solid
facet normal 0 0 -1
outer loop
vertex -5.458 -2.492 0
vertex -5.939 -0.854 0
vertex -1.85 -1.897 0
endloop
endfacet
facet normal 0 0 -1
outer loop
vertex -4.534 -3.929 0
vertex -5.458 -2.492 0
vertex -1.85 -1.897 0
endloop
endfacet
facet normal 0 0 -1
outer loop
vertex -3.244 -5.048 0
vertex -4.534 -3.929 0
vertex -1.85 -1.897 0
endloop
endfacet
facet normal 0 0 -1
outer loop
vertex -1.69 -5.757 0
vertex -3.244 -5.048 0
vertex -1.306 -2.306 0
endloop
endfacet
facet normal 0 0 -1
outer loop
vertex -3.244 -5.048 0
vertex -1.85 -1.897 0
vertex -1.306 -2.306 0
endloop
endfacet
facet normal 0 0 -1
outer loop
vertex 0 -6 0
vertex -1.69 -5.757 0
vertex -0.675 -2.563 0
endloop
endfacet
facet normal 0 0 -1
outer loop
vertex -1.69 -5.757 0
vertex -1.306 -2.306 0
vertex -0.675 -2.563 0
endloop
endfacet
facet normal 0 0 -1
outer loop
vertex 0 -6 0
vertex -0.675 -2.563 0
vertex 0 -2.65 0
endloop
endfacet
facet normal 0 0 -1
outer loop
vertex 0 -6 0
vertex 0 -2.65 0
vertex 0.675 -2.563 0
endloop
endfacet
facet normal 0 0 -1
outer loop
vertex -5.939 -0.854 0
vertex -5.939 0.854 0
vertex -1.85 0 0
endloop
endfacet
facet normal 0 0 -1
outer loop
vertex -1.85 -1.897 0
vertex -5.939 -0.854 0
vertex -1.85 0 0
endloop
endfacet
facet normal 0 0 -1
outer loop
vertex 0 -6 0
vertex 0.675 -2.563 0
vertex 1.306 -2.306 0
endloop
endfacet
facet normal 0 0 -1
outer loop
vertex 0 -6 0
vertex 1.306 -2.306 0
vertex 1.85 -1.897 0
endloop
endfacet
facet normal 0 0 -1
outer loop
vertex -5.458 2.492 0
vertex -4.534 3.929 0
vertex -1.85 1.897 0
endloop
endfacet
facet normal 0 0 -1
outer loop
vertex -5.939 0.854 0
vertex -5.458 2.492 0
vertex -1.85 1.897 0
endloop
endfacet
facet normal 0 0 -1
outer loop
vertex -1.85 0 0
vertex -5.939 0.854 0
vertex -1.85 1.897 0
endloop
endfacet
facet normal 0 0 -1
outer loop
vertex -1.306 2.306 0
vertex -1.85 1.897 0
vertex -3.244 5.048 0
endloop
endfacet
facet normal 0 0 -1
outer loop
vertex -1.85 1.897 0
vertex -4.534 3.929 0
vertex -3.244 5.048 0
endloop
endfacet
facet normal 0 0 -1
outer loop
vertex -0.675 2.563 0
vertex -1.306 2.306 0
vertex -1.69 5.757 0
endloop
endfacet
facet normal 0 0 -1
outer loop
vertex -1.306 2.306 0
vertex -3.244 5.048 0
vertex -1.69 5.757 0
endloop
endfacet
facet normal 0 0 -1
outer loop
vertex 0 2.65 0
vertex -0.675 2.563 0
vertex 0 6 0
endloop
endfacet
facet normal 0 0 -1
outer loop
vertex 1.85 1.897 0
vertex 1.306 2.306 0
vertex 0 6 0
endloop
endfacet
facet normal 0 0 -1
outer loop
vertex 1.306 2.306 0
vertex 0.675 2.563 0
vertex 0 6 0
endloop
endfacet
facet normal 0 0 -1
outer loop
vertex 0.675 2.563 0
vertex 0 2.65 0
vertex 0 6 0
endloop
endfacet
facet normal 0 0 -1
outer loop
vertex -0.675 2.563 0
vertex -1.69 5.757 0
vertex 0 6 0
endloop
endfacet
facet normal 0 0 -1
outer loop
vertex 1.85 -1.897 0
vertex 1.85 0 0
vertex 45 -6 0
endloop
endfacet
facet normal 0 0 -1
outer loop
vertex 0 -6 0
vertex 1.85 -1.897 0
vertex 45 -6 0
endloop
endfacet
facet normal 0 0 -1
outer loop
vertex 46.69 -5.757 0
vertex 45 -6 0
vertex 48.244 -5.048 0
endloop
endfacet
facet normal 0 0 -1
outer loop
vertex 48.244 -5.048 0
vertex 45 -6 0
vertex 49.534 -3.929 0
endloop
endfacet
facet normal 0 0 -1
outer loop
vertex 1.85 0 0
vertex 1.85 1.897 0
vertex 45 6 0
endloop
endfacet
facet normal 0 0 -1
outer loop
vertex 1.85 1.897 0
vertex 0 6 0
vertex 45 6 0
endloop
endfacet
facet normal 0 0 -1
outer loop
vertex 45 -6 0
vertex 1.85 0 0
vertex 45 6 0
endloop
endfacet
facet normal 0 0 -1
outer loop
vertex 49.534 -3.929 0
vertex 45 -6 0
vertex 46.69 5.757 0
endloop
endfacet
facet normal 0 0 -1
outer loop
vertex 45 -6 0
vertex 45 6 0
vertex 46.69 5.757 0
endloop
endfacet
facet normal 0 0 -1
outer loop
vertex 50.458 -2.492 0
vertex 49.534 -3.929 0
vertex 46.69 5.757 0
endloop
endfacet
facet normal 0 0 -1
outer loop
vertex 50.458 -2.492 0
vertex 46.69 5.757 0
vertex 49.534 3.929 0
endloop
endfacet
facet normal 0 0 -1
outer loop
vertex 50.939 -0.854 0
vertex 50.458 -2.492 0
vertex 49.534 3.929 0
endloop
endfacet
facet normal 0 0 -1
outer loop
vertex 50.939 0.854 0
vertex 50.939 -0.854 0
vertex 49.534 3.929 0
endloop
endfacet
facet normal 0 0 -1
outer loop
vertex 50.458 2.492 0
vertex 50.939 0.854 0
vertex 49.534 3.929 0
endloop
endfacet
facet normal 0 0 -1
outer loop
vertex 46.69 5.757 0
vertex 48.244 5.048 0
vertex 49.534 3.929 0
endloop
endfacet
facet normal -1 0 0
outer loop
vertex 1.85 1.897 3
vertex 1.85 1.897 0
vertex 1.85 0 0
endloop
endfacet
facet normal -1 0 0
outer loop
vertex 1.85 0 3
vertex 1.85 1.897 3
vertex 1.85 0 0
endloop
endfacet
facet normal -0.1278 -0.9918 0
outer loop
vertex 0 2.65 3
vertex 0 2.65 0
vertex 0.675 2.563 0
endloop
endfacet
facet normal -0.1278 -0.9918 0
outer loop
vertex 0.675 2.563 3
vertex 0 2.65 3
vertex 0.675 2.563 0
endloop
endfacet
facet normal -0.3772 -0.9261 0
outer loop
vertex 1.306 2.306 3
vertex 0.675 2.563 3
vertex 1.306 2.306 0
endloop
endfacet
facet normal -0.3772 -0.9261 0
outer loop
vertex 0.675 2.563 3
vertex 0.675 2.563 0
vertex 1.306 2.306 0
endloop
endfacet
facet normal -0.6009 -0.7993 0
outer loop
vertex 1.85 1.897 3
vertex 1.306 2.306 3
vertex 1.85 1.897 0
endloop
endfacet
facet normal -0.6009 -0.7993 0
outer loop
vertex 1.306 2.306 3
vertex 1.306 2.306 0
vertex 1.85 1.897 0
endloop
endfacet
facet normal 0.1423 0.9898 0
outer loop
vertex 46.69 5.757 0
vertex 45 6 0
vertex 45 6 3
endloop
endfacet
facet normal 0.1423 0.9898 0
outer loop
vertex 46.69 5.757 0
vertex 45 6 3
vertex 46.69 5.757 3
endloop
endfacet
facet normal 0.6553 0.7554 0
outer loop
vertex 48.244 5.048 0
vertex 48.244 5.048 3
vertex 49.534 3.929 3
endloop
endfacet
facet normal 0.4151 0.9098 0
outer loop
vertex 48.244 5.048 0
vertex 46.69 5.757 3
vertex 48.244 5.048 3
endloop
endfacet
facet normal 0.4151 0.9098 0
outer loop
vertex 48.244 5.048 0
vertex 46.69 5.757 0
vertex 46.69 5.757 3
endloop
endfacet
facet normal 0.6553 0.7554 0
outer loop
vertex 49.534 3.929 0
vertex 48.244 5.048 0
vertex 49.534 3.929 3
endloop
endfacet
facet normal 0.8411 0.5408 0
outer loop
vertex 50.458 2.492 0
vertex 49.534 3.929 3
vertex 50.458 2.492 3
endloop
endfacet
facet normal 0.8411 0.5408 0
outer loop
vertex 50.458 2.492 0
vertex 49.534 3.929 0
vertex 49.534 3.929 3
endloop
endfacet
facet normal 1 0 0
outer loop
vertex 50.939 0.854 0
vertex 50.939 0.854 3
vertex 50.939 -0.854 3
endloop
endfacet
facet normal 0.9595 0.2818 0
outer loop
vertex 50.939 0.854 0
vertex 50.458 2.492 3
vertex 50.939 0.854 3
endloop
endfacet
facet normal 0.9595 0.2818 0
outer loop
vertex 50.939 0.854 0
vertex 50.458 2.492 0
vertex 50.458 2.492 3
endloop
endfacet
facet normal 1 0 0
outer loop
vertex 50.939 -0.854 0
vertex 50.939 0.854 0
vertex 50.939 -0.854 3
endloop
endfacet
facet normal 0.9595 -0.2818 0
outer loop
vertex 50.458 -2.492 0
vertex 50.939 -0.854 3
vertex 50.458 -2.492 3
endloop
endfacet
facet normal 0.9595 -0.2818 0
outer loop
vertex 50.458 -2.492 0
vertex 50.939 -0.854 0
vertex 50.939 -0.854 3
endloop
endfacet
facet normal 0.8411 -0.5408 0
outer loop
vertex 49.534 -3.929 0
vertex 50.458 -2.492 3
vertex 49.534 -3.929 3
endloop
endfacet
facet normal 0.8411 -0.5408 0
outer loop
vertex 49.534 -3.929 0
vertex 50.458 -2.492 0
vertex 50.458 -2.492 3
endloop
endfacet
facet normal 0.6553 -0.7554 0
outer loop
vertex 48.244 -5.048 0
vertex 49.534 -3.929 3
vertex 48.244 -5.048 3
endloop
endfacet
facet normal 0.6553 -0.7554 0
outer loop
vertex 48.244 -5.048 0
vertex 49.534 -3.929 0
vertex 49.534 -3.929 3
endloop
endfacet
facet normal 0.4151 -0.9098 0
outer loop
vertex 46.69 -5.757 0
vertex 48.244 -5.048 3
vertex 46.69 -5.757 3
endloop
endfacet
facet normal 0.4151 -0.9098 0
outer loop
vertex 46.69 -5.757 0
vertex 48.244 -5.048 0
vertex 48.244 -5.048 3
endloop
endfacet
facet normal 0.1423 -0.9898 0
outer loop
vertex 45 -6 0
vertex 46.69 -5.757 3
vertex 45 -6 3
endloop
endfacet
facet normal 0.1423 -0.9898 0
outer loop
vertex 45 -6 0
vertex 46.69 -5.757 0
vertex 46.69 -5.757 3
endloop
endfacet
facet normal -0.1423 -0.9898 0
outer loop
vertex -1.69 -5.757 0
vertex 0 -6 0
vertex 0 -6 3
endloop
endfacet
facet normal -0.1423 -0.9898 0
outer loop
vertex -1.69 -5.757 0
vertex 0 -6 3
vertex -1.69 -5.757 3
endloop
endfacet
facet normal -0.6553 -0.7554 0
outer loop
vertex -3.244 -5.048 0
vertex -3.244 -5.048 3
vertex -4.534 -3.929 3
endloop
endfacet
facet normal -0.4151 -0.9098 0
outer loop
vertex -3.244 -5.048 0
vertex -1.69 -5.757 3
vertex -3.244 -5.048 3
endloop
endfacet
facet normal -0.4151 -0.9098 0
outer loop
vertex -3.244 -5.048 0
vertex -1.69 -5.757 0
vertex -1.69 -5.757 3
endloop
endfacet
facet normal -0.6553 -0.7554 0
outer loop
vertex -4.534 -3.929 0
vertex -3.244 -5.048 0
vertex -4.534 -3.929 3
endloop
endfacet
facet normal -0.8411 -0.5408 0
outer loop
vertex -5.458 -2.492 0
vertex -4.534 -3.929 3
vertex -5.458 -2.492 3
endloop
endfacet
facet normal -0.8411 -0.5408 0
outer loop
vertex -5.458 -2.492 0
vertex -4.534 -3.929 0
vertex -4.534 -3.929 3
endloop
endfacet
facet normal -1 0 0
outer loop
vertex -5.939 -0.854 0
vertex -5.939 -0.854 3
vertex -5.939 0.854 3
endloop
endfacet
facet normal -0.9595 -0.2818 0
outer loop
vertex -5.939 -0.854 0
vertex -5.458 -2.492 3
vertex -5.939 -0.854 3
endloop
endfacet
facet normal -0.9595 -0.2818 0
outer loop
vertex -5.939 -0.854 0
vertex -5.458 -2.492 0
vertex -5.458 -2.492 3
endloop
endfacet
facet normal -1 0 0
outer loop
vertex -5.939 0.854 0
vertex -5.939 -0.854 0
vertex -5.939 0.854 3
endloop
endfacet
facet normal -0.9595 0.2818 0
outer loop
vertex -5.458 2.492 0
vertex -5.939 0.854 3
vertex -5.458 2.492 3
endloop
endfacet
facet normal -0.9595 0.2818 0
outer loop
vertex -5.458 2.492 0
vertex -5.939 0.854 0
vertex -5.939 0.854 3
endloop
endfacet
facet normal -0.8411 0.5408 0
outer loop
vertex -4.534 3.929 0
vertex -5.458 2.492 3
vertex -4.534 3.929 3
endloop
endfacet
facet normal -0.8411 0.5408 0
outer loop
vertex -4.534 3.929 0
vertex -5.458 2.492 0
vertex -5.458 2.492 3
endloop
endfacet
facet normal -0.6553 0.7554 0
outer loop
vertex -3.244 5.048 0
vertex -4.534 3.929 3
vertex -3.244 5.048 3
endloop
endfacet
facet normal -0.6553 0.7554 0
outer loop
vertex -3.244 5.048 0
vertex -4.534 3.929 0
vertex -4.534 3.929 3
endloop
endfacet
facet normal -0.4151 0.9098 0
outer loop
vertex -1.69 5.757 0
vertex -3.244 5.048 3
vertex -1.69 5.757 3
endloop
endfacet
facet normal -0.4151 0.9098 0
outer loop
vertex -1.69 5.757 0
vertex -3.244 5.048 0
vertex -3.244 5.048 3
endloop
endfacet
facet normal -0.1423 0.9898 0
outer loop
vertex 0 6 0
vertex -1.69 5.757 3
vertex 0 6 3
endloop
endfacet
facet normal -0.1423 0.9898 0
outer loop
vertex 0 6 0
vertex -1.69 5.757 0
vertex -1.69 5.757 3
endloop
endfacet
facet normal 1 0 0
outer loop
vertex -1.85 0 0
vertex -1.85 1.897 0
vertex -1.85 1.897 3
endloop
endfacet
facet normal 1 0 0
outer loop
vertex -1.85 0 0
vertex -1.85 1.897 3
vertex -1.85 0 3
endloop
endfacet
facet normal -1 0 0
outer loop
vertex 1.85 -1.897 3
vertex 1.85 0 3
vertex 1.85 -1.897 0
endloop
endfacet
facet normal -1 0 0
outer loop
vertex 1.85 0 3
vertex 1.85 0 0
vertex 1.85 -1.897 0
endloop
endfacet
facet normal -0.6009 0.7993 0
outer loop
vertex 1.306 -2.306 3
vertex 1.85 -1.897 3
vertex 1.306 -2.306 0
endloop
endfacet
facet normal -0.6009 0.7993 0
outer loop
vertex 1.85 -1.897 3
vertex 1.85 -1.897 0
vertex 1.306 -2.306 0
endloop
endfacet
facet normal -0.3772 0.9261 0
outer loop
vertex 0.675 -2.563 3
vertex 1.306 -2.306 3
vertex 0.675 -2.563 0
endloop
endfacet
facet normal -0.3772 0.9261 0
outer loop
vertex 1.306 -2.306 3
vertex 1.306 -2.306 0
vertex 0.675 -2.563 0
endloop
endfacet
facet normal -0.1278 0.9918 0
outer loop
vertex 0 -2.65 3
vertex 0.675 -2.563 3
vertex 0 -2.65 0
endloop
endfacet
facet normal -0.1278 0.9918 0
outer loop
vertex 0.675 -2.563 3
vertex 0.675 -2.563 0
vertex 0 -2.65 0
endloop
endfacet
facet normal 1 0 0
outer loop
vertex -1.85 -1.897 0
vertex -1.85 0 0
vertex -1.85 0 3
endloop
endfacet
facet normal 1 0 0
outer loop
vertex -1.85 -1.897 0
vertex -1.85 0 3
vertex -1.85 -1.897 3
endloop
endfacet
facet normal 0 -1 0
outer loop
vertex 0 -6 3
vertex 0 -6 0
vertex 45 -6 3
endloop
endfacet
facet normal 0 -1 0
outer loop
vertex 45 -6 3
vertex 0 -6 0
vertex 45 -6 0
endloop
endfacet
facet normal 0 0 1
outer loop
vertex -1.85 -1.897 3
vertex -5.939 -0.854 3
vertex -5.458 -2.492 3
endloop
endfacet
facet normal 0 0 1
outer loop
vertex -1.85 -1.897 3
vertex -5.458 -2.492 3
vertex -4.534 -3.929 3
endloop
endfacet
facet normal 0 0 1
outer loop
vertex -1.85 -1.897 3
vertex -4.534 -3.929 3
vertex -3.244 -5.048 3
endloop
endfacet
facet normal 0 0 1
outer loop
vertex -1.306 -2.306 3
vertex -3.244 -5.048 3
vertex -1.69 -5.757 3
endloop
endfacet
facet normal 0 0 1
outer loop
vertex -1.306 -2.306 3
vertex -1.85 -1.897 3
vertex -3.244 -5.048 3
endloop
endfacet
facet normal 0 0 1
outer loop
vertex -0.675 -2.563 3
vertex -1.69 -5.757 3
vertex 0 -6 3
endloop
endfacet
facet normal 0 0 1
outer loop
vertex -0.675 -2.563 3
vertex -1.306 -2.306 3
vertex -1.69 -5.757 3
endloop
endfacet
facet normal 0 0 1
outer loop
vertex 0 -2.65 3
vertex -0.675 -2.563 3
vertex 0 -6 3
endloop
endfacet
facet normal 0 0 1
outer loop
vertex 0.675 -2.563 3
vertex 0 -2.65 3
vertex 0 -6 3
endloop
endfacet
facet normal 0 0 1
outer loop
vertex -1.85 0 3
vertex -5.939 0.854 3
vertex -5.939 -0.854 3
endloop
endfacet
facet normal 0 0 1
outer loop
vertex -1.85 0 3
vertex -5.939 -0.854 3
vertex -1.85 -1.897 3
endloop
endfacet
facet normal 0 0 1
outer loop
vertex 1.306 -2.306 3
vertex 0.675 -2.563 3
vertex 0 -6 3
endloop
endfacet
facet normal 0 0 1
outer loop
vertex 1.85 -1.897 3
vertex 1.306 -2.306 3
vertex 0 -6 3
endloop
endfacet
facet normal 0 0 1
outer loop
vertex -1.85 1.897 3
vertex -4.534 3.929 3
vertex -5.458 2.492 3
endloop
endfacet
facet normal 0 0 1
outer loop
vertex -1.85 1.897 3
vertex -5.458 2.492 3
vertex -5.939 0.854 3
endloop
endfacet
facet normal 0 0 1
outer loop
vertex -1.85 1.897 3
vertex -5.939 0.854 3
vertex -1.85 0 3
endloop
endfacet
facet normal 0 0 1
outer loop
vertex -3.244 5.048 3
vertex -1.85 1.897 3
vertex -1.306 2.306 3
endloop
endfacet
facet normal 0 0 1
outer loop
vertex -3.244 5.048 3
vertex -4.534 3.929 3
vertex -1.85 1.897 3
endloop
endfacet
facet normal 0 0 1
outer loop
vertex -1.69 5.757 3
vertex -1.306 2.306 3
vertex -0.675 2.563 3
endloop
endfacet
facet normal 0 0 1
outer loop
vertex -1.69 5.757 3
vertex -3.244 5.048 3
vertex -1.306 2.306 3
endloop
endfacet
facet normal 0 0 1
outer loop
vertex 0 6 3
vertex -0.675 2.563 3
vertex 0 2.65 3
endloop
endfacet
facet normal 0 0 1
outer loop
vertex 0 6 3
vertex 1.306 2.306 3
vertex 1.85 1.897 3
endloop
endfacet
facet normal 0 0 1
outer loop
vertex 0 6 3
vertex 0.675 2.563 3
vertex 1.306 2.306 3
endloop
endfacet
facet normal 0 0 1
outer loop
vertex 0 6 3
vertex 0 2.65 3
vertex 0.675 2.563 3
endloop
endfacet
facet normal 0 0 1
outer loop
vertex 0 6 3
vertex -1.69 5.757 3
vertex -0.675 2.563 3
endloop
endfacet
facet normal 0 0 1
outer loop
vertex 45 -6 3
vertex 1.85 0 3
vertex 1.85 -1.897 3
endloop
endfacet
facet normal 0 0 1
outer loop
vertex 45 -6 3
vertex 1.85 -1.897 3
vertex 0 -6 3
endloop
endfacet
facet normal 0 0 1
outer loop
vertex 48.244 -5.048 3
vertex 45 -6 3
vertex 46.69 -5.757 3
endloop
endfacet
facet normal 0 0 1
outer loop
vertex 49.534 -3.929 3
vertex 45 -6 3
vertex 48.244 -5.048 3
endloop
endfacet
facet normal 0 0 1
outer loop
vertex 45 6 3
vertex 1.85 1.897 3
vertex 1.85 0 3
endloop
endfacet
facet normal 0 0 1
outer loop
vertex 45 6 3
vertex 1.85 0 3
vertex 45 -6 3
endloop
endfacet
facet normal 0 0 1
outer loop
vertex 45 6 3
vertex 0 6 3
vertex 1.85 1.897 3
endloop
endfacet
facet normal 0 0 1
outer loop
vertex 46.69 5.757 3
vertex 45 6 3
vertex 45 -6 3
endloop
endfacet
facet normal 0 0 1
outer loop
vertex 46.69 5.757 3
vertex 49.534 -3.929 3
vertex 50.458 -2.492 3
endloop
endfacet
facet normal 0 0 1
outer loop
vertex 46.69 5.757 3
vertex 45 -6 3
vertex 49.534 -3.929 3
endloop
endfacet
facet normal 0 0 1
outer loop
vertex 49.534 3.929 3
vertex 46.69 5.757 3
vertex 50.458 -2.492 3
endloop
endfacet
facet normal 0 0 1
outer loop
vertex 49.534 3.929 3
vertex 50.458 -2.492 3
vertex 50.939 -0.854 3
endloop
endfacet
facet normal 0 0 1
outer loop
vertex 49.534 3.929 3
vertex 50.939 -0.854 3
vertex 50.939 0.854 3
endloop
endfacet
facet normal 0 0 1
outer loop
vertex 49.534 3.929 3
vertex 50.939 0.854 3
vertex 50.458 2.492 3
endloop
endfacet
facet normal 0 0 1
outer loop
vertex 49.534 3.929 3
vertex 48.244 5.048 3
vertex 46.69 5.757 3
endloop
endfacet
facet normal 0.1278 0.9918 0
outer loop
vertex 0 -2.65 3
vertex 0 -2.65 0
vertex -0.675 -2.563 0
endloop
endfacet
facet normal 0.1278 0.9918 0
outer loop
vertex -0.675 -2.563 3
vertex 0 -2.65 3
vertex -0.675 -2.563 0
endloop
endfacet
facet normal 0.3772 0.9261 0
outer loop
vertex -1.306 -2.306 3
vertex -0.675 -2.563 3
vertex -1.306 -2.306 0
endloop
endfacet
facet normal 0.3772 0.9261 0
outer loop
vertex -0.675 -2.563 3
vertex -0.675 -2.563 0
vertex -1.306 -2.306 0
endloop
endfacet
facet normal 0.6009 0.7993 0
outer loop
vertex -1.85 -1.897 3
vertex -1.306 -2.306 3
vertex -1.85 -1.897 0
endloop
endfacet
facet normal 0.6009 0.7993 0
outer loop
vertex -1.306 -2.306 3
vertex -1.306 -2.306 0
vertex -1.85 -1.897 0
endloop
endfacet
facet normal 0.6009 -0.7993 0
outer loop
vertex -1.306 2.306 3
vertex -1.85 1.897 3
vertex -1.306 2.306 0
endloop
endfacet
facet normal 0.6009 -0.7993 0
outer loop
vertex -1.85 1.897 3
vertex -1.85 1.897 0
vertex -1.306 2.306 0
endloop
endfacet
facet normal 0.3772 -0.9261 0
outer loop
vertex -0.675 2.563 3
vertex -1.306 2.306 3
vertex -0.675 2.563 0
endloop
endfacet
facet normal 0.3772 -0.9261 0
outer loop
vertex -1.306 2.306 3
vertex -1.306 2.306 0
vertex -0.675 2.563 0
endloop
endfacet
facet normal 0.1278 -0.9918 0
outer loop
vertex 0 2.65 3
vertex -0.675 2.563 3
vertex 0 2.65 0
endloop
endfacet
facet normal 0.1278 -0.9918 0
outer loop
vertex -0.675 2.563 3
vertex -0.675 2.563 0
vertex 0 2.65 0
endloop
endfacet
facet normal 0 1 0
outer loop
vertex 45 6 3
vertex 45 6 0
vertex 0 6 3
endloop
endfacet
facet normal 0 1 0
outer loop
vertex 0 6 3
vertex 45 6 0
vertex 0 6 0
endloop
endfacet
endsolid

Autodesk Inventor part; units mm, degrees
ref_plane "YZ Plane" through (0, 0, 0) normal (1, 0, 0) x (0, 1, 0)
ref_plane "XZ Plane" through (0, 0, 0) normal (0, 1, 0) x (-1, 0, 0)
ref_plane "XY Plane" through (0, 0, 0) normal (0, 0, 1) x (1, 0, 0)
sketch "Sketch1" plane through (0, 0, 0) normal (0, 0, 1) x (1, 0, 0)
  line L0 (0, 2.65) -> (0, -2.65)
  line L1 (-1.85, 0) -> (1.85, 0)
  line L2 (1.85, 1.8974) -> (1.85, -1.8974)
  arc A0 (1.85, 1.8974) -> (-1.85, 1.8974) centre (0, 0) ccw
  line L3 (-1.85, 1.8974) -> (-1.85, -1.8974)
  arc A1 (-1.85, -1.8974) -> (1.85, -1.8974) centre (0, 0) ccw
  line L4 (0, 0) -> (45, 0) construction
  line L5 (0, -6) -> (45, -6)
  line L6 (45, 6) -> (0, 6)
  arc A2 (0, 6) -> (0, -6) centre (0, 0) ccw
  arc A3 (45, -6) -> (45, 6) centre (45, 0) ccw
  point P0 (22.5, 0)
  dimension "d0" = 2.65
  dimension "d1" = 3.7
  dimension "d2" = 6
  dimension "d3" = 45
extrude "Plate1" add sketch "Sketch1" along normal blind 3
equation "\"d4\" = Thickness"
equation "\"BendRadius\" = Thickness"
equation "\"BendReliefWidth\" = Thickness"
equation "\"BendReliefDepth\" = 0.5 * Thickness"
equation "\"CornerReliefSize\" = 4 * Thickness"
equation "\"MinimumRemnant\" = 2 * Thickness"
equation "\"TransitionRadius\" = BendRadius"
equation "\"JacobiRadiusSize\" = BendRadius"
equation "\"GapSize\" = Thickness"
equation "\"Thickness\" = 3"
properties part number "Shooting Arm V2"
